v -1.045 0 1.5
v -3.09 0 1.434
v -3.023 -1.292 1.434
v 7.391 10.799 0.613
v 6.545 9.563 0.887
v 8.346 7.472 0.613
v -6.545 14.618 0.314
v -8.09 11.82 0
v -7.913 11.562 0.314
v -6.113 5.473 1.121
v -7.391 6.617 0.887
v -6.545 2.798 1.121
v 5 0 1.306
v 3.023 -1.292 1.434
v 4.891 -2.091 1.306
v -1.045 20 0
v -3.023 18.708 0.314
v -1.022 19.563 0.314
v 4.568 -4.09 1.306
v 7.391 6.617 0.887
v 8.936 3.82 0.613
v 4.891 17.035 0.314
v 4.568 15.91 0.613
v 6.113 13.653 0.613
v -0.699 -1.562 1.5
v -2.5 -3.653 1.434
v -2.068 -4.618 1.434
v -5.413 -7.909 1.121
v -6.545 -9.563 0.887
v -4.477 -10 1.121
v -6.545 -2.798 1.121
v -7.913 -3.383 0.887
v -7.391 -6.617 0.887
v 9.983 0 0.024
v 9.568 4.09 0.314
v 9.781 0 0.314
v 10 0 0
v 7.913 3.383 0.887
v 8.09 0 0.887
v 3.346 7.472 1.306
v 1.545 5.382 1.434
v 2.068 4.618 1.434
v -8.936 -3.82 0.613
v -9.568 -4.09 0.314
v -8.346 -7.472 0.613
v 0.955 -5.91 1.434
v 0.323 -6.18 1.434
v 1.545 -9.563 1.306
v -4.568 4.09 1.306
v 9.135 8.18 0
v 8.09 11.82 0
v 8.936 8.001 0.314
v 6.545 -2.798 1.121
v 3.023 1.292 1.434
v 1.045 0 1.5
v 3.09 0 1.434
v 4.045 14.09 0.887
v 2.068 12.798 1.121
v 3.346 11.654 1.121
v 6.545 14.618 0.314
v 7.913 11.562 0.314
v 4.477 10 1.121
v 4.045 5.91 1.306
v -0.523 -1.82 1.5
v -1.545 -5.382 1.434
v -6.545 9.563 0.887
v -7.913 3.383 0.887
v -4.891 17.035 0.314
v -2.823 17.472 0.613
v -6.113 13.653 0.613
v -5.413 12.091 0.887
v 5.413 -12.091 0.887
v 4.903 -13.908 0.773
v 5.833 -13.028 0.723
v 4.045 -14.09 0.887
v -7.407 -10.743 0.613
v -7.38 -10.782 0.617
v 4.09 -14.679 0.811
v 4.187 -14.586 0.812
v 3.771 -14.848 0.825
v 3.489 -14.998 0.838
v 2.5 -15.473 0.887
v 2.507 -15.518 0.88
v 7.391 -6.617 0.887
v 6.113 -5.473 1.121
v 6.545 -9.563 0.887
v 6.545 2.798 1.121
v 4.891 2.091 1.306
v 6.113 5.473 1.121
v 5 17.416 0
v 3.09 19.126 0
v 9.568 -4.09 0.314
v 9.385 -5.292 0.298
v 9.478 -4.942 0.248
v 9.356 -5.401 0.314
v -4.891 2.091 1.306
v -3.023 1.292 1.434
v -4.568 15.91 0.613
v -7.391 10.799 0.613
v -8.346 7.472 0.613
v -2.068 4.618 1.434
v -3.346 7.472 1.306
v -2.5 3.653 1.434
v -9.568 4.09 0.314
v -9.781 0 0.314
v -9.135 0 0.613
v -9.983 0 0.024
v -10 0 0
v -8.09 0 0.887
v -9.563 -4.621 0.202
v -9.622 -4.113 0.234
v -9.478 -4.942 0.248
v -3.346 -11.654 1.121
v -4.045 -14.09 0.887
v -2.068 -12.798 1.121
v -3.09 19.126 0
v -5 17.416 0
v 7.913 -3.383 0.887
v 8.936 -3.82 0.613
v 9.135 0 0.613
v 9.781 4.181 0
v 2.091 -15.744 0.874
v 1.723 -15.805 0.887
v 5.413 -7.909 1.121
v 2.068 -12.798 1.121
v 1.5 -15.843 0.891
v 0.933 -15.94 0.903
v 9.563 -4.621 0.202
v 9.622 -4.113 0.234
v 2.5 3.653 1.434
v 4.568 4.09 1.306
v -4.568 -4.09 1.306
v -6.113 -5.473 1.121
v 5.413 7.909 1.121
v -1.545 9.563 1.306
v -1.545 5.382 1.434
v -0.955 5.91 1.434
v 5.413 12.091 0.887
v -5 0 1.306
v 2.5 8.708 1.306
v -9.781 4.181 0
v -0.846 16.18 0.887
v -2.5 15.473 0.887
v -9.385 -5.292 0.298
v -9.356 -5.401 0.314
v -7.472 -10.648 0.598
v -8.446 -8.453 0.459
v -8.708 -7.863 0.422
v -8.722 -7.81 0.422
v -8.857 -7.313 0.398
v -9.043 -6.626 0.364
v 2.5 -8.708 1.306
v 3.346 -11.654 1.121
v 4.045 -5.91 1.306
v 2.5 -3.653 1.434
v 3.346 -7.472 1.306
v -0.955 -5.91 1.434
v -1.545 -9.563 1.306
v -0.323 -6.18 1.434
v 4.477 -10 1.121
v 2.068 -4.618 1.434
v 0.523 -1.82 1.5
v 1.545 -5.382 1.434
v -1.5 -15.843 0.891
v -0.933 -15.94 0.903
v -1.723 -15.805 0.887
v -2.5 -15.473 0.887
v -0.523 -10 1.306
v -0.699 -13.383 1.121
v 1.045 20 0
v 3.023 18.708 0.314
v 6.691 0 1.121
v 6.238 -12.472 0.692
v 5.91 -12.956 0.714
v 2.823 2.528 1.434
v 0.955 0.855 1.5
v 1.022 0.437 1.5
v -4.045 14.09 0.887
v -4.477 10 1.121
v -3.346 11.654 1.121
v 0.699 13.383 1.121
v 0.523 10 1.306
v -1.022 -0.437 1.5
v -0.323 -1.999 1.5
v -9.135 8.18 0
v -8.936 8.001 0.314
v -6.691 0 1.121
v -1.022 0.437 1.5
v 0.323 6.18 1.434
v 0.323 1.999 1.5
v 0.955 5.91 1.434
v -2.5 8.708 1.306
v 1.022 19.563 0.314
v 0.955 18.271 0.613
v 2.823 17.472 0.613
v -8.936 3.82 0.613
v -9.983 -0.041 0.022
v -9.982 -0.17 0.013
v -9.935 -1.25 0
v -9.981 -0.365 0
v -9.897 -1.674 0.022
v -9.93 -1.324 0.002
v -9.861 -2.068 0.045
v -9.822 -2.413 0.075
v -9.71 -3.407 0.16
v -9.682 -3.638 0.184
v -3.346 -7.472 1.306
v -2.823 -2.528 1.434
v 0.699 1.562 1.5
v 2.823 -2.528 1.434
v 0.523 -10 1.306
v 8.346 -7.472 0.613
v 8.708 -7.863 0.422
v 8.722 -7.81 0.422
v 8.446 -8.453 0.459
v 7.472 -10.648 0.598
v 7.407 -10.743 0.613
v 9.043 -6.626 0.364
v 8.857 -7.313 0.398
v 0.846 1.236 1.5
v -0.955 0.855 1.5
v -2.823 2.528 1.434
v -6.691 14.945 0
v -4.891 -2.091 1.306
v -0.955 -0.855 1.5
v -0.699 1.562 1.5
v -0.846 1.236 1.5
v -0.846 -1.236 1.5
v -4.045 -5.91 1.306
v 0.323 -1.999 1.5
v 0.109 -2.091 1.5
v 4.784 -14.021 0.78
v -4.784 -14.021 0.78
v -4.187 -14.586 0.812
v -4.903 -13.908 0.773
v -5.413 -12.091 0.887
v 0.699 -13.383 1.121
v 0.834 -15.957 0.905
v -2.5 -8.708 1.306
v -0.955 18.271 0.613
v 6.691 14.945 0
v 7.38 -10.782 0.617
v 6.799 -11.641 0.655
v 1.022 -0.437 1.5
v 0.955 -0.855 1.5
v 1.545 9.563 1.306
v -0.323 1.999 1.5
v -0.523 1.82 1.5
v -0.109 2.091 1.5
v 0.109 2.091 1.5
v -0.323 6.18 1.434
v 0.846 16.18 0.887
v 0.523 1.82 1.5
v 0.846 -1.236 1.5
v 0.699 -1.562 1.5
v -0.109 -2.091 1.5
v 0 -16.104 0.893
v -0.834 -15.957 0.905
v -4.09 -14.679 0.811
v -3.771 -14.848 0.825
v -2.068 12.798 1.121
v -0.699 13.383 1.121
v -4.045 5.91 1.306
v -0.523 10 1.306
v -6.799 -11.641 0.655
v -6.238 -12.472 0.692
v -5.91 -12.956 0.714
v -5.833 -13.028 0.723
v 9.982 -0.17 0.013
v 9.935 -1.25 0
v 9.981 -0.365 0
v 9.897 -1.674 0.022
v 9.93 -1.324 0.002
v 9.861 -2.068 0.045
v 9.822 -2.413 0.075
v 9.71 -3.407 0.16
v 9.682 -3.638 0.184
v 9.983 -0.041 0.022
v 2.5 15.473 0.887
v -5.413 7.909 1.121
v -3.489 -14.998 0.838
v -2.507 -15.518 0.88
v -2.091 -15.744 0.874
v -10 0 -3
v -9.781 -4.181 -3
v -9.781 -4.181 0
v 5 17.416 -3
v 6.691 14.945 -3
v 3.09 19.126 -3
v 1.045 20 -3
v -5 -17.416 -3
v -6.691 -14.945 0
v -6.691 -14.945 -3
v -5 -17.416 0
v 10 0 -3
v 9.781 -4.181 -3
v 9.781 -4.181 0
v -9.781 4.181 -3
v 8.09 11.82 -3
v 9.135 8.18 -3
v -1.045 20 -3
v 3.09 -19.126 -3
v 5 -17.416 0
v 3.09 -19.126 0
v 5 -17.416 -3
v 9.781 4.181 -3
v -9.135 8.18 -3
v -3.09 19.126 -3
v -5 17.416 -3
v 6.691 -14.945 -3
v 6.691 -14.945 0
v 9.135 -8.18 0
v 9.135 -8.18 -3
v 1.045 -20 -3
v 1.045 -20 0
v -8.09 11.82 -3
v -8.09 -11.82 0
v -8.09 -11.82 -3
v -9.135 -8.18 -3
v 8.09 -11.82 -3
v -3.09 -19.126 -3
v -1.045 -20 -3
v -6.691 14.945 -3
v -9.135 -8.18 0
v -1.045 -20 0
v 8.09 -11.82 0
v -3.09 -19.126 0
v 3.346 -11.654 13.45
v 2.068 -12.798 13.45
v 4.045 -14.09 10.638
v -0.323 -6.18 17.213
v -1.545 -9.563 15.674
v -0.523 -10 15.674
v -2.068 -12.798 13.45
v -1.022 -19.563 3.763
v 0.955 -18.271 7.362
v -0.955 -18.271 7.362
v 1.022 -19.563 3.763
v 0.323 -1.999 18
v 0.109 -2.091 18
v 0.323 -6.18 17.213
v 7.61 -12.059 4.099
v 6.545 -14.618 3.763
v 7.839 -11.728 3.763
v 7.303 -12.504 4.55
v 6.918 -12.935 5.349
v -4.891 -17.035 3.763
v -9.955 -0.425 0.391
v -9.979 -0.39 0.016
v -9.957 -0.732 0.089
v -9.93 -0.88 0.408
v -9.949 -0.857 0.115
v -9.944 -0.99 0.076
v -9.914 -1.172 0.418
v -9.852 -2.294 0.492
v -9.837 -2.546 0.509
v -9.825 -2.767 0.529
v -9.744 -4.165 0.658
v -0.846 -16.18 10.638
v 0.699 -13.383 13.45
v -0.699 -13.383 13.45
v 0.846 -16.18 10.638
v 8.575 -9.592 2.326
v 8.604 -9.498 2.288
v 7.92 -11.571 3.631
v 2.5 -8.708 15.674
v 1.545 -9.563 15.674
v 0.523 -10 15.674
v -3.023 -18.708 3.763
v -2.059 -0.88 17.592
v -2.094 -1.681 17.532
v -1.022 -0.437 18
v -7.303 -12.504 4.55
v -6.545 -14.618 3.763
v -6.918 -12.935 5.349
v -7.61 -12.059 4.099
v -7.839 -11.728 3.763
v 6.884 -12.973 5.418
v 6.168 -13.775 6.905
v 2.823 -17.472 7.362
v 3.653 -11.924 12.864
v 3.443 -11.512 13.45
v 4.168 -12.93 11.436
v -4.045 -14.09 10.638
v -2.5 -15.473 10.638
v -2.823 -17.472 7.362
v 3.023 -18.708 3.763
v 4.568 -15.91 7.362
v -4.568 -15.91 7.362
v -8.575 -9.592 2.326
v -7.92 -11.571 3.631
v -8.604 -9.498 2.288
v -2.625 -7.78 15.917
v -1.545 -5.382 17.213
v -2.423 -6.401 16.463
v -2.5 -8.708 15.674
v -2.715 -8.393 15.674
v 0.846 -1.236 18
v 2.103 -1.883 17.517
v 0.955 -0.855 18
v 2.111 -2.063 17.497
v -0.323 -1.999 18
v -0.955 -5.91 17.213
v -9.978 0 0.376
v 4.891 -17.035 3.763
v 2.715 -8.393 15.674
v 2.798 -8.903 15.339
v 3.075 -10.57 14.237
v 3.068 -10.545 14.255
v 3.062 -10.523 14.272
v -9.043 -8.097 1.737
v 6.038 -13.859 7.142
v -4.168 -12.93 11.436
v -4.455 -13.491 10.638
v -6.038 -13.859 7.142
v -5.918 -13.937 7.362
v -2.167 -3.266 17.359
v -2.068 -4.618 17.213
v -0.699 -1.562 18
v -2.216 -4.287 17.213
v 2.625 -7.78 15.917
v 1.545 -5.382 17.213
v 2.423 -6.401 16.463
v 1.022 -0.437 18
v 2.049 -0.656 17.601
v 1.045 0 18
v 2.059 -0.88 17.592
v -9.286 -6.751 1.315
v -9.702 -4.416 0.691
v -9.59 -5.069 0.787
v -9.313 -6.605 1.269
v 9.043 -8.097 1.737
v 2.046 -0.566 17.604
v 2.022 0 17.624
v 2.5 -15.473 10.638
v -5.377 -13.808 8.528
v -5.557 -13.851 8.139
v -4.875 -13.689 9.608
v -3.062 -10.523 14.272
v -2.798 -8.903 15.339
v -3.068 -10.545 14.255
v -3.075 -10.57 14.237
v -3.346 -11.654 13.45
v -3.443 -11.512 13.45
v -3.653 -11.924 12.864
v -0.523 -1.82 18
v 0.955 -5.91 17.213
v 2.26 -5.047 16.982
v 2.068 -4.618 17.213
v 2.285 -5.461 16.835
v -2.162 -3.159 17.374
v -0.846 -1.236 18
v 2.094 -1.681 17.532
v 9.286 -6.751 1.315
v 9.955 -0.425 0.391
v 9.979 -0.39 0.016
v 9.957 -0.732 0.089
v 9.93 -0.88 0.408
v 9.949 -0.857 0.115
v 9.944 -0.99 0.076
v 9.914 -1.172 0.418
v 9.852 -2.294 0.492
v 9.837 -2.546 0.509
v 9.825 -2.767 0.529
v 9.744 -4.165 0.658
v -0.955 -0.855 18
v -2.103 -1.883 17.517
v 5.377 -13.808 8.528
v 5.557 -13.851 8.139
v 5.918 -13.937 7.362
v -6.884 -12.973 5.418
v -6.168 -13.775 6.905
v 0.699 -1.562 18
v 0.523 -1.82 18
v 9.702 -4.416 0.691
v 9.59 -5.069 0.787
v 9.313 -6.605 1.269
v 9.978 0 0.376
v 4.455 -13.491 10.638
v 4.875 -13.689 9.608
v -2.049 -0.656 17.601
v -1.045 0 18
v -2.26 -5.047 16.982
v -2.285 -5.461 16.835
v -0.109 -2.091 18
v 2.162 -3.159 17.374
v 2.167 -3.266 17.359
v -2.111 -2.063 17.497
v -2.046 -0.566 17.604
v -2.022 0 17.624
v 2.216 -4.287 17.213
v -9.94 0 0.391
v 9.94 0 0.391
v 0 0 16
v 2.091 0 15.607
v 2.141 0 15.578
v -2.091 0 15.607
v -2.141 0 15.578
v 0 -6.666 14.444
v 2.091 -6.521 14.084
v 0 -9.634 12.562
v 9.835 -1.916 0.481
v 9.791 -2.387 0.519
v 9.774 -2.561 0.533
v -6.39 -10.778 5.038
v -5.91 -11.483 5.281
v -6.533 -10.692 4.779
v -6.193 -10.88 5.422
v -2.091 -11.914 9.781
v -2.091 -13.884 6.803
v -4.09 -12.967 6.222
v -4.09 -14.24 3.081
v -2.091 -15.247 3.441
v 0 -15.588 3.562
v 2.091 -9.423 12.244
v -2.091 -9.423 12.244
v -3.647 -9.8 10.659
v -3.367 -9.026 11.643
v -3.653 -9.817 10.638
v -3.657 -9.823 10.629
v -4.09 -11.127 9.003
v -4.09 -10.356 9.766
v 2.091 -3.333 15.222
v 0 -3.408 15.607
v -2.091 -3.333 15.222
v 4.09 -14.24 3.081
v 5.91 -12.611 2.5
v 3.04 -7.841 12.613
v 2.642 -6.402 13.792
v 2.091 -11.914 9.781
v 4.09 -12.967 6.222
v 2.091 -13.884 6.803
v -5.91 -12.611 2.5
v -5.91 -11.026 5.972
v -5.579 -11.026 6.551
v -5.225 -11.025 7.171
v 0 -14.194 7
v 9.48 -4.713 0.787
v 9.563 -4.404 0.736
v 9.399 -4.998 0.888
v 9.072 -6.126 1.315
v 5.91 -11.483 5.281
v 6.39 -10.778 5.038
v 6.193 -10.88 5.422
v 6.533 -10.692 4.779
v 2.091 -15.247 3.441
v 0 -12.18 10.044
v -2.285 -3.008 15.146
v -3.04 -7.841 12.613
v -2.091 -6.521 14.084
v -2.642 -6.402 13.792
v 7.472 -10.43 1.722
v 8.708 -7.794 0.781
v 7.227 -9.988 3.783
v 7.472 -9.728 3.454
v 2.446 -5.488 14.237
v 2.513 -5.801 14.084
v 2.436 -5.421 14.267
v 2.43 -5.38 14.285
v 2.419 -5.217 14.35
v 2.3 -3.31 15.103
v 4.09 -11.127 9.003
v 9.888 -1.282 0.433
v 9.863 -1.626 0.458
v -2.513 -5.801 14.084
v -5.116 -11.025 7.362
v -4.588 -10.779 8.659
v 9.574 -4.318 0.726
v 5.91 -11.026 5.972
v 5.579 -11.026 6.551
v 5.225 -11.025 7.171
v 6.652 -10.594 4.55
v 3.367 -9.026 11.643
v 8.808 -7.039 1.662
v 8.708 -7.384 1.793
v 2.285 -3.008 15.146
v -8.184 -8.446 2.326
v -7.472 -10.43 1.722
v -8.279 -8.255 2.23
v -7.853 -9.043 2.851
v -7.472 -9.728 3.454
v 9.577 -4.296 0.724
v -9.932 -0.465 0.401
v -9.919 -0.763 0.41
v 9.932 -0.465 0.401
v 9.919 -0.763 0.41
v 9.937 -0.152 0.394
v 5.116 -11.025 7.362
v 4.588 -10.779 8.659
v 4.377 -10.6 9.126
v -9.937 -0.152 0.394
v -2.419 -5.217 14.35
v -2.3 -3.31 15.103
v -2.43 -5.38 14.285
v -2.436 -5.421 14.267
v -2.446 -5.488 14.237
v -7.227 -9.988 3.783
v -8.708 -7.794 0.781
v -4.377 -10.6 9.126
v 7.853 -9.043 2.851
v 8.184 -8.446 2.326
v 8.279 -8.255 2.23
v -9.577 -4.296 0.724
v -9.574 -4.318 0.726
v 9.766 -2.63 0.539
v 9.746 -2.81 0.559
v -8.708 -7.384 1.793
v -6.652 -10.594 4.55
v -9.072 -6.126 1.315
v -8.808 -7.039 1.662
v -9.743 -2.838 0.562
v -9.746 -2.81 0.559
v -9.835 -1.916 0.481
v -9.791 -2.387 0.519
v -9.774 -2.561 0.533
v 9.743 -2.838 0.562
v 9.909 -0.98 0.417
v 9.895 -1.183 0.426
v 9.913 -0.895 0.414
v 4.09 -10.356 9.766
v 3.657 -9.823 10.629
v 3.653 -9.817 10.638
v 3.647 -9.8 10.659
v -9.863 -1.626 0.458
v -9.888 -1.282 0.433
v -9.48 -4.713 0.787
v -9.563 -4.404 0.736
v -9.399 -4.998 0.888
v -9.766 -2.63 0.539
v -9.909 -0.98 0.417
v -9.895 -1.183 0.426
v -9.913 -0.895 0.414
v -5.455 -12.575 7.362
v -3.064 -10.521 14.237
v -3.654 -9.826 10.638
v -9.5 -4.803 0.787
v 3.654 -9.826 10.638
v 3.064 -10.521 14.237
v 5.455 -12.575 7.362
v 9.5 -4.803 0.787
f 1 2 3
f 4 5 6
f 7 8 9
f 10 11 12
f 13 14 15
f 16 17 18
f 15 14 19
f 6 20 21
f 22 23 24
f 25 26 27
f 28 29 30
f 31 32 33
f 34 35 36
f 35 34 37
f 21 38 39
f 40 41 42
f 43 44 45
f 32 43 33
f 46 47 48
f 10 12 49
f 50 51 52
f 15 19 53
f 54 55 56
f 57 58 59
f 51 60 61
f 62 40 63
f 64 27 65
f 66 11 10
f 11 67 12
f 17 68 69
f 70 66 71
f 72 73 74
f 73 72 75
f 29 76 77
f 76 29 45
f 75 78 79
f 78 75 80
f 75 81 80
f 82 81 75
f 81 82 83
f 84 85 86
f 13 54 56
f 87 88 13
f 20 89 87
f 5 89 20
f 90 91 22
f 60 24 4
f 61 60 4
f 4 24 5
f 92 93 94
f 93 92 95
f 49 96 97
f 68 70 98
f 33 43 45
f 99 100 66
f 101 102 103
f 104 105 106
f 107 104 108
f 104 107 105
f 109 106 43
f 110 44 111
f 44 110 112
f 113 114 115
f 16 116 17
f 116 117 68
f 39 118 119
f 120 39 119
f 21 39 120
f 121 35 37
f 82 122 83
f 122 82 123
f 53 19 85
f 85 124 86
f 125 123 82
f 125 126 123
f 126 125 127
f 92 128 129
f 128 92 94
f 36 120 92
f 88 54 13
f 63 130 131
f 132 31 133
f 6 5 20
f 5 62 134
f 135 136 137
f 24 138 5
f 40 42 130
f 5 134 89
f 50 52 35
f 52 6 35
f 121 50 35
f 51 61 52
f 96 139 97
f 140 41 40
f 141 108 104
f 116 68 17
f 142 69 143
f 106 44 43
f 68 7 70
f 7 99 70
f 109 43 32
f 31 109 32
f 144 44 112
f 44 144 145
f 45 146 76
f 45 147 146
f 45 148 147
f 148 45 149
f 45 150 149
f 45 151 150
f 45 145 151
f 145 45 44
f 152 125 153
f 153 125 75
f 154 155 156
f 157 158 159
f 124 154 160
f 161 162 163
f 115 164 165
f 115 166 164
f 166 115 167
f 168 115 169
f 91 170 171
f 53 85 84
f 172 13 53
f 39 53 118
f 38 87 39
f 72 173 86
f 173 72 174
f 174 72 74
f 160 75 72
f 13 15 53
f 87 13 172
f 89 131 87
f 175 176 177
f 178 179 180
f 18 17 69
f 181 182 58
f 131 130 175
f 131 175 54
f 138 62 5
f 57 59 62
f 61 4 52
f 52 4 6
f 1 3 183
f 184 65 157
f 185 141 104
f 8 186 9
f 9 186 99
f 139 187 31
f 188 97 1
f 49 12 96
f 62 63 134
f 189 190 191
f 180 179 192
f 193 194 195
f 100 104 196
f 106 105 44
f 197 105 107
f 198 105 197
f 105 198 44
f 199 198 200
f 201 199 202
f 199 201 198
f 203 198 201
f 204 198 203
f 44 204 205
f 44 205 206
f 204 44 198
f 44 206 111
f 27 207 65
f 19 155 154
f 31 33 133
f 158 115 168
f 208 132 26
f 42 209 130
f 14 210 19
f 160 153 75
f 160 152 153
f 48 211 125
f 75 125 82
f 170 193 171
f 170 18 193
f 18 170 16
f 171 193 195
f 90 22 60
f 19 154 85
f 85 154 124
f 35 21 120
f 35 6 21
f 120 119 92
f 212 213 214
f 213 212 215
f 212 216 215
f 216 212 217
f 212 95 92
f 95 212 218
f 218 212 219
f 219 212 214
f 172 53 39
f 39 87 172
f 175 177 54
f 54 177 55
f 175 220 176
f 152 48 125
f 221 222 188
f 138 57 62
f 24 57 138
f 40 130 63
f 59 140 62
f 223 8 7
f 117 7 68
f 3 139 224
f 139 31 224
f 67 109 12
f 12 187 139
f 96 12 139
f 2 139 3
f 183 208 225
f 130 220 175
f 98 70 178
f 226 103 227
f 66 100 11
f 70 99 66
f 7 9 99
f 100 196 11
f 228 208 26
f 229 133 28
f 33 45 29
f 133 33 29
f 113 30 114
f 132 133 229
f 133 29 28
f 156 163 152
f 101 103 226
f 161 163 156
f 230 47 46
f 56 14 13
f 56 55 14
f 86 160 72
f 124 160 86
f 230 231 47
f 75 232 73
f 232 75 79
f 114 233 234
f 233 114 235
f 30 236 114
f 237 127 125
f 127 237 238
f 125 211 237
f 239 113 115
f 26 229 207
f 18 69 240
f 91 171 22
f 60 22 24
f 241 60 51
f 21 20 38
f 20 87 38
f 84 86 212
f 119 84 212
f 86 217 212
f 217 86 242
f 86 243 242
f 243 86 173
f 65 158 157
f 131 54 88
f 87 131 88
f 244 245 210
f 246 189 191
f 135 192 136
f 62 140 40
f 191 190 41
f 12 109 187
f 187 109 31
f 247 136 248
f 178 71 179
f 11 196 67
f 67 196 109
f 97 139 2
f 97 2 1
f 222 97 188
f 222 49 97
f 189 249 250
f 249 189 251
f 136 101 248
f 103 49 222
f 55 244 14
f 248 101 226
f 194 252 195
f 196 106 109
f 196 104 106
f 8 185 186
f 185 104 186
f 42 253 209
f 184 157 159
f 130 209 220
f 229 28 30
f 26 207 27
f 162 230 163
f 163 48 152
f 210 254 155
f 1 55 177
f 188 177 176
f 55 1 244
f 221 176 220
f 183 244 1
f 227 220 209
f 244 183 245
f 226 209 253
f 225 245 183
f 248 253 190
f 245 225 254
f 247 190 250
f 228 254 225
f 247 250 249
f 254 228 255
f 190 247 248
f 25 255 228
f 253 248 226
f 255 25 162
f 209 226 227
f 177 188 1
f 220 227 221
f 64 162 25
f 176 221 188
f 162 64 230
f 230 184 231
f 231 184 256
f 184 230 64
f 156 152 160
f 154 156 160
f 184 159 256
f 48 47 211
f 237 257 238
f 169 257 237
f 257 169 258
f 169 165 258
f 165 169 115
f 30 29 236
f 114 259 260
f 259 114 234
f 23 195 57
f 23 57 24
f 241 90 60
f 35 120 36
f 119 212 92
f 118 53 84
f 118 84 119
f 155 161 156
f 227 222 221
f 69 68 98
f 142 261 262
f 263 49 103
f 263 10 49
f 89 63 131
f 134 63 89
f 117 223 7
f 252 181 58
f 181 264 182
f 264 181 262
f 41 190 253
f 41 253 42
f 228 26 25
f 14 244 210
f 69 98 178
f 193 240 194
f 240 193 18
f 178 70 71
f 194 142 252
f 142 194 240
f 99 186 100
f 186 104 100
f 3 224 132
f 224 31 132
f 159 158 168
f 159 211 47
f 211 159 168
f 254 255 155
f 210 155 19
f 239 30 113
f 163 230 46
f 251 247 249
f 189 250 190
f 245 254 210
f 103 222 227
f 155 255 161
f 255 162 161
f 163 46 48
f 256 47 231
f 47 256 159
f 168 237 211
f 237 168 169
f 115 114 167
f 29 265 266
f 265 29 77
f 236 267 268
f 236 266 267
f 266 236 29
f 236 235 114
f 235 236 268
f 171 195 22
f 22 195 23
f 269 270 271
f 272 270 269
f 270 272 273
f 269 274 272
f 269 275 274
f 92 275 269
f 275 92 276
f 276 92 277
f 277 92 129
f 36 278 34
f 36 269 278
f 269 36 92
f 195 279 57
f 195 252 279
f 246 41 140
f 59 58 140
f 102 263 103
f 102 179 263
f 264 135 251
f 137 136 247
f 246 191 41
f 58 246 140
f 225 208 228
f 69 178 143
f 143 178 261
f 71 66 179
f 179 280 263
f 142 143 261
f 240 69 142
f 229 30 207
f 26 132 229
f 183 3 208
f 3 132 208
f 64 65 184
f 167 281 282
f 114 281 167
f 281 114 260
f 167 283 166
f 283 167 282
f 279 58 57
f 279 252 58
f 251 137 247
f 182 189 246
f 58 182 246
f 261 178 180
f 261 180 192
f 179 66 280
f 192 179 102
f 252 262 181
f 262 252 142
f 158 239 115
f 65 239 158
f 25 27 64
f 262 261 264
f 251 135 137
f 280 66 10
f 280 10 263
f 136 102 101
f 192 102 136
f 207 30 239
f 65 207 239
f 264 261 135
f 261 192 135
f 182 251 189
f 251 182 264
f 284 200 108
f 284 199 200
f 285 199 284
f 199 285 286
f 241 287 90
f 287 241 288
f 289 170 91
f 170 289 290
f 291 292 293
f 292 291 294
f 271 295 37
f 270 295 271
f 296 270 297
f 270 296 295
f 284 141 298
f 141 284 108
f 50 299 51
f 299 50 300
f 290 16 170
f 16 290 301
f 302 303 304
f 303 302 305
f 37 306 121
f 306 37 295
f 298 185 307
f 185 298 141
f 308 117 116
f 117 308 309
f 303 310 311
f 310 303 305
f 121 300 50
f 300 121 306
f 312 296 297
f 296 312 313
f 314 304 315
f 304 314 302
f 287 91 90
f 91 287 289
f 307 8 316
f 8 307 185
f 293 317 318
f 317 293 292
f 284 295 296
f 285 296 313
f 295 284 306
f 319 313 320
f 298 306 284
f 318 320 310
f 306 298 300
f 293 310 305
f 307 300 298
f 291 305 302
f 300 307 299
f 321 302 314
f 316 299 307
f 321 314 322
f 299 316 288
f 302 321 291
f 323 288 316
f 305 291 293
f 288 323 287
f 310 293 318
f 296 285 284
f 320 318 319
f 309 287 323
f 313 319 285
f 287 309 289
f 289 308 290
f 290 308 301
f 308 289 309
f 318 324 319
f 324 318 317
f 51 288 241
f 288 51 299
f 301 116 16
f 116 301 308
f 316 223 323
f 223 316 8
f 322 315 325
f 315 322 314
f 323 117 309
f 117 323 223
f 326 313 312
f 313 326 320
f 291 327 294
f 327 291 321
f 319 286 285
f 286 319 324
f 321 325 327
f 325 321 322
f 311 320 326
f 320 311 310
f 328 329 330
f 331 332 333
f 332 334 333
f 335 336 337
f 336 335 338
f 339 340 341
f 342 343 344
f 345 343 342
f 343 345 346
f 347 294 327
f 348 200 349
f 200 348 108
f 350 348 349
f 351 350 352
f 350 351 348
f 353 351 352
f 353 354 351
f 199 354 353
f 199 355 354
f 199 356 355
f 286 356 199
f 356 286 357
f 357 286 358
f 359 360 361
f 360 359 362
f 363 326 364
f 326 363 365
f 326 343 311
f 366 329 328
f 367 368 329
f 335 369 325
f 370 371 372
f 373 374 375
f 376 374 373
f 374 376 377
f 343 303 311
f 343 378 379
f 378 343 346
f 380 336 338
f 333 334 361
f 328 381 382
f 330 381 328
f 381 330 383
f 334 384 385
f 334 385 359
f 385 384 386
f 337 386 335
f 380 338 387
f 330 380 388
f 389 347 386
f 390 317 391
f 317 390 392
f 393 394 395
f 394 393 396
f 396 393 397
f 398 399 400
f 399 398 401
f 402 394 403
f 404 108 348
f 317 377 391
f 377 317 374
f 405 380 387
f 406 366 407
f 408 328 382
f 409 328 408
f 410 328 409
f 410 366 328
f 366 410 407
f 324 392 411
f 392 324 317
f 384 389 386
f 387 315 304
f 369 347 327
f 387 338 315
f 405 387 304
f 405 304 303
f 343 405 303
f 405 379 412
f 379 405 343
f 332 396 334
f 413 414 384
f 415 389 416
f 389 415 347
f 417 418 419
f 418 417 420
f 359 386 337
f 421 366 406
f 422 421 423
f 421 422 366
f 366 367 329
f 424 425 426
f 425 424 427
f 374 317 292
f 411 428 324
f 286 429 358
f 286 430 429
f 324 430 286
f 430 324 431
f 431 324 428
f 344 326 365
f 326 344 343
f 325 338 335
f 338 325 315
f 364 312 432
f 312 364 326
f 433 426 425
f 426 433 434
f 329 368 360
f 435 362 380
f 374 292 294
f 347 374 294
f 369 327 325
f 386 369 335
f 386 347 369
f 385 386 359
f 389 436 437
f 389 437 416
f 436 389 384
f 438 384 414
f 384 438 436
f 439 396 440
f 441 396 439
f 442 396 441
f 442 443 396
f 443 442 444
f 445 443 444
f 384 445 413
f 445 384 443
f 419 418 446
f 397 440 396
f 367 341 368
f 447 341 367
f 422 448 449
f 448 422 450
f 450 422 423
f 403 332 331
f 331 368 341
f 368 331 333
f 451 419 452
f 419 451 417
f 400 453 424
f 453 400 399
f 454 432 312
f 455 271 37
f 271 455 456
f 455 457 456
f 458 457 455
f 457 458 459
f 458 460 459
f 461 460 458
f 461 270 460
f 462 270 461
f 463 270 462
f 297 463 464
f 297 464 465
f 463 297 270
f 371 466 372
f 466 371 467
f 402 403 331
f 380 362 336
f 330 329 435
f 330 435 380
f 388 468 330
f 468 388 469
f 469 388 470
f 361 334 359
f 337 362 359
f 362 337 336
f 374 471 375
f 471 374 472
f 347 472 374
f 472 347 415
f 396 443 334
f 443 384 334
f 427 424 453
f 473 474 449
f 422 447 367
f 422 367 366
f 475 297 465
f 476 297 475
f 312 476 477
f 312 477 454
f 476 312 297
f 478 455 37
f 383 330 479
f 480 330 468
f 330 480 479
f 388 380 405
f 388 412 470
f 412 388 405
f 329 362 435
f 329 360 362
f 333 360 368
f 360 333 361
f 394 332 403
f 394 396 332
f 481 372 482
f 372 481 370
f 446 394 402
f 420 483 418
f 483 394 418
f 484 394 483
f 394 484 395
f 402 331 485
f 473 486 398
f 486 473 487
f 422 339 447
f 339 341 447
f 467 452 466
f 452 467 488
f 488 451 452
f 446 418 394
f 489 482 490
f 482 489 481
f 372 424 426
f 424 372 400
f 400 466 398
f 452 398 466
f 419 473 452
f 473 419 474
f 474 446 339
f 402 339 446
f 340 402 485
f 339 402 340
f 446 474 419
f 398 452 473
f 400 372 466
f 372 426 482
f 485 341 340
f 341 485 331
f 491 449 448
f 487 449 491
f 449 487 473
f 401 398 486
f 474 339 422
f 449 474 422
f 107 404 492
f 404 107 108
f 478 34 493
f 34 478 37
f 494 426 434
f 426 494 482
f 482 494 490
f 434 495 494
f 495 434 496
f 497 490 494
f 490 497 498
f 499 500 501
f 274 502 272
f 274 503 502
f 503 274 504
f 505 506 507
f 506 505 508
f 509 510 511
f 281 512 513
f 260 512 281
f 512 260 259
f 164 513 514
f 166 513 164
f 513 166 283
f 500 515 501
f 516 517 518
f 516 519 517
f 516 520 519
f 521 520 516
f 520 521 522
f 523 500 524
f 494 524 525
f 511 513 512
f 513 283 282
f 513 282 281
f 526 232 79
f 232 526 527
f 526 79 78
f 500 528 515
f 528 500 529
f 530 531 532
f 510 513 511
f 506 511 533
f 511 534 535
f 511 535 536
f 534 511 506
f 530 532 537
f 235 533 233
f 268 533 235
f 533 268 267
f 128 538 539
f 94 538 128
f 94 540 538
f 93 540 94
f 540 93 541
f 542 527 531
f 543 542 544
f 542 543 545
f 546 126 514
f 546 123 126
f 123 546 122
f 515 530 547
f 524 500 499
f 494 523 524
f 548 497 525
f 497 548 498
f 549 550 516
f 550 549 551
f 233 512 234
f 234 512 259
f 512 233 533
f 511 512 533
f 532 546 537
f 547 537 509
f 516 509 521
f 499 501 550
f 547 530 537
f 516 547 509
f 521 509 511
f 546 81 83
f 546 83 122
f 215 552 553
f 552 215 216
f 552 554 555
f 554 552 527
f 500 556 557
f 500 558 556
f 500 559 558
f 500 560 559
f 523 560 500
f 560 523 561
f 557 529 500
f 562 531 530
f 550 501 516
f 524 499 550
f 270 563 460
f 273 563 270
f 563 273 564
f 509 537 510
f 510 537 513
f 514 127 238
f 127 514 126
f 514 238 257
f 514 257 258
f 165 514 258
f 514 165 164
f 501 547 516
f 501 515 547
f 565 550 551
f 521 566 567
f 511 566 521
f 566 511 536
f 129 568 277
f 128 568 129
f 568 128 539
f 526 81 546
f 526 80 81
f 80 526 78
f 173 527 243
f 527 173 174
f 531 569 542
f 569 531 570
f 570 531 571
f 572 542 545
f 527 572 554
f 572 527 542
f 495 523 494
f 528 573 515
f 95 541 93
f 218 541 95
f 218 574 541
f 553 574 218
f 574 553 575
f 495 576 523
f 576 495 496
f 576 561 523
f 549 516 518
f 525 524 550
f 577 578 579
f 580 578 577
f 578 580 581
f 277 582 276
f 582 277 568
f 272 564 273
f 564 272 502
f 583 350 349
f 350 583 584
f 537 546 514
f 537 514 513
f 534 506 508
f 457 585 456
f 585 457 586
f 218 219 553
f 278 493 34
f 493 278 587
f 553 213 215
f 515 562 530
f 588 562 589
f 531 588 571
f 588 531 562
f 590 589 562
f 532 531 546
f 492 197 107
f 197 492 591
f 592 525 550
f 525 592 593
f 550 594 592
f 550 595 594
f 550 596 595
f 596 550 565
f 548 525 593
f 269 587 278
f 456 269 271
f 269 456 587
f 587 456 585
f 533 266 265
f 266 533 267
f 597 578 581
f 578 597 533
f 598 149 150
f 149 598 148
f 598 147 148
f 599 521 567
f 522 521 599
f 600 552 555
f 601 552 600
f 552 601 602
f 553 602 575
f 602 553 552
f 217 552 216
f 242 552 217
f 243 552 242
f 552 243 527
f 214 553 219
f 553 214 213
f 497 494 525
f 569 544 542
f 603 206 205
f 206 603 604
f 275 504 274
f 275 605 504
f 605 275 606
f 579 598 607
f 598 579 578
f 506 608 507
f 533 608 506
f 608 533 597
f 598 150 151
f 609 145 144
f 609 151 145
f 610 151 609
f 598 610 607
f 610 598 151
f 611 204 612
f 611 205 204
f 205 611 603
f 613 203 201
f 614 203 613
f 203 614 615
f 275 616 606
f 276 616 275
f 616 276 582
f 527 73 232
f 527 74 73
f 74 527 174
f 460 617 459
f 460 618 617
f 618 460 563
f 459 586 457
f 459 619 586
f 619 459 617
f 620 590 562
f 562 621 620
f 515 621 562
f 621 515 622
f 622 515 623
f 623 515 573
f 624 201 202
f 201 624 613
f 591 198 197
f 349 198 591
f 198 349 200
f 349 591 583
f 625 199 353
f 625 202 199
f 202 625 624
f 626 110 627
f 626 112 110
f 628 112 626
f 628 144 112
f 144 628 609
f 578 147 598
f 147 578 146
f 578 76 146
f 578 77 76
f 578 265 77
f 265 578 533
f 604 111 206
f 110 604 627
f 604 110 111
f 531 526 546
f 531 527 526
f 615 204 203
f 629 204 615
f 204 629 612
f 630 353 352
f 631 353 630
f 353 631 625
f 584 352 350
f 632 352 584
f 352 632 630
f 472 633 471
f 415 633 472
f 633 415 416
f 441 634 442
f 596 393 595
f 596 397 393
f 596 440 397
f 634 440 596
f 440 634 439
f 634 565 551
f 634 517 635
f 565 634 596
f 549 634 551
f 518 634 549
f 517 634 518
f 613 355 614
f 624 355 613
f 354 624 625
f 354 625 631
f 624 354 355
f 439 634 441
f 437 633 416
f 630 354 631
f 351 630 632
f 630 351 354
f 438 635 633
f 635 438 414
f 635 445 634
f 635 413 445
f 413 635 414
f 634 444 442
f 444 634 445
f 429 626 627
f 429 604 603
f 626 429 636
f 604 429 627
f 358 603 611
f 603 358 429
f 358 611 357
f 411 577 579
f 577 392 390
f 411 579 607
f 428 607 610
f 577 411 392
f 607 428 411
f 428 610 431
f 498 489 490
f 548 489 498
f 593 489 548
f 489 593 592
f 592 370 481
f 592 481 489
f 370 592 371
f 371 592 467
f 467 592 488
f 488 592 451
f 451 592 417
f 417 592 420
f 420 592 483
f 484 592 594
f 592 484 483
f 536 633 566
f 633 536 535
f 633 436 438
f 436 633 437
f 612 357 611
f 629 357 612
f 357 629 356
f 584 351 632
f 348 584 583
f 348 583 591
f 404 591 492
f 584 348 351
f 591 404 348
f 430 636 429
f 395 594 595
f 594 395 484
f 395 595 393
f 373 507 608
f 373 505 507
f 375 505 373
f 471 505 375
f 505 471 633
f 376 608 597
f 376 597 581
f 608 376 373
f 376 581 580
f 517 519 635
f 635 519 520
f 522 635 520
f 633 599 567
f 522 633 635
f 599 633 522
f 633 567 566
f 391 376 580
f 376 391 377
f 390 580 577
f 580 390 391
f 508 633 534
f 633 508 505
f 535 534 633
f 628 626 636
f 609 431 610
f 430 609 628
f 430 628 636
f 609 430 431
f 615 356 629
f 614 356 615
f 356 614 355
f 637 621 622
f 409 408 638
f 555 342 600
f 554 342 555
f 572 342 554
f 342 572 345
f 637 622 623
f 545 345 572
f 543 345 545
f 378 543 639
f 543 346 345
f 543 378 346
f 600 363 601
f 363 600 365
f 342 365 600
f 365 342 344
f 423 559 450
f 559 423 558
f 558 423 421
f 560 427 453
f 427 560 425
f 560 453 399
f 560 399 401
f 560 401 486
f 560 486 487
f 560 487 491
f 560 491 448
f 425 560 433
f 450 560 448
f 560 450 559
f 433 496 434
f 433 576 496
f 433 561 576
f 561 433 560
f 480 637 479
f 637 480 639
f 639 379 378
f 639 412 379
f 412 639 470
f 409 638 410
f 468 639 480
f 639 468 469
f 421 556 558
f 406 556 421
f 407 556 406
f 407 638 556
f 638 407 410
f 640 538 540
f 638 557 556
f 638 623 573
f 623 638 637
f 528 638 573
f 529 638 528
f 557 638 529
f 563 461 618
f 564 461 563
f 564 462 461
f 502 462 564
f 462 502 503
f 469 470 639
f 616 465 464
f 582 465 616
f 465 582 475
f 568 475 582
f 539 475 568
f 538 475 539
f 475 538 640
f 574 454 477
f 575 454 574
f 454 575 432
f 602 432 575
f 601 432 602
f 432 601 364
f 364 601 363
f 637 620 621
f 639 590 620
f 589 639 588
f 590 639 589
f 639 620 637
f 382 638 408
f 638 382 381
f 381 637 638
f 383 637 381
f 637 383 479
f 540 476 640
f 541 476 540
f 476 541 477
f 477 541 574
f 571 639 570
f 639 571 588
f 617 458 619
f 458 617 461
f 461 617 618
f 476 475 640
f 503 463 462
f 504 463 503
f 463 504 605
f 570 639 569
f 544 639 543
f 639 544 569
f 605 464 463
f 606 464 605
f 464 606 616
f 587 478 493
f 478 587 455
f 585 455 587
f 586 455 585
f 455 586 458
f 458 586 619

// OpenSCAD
base_thickness = 6;
base_height = 40;
base_width = 20;
hook_distance = 36;
fixing_hole = 0;      //[0:OFF, else:diameter]
// new parameters by mcmusic :
point_size = 2;       // the size of the hook tip
more_cutaway = 0.7;   // [0:originalDesign to 1:maximumCutaway]
base_convexity = 3.0; //0.001=flat; 3=original
// The sticky tape can be hidden in a cavity below the base.
// But this must eventually be printed with support - may be difficult to remove.
cavity = 0;           //[0:OFF, else: cavity_depth]
cavity_rim = 2;

Sfn = 30; //30 for testing, 90 for prints.

module Cavity() {
  if (cavity > 0)
  {
    color("red")
    translate([0, 0, -base_thickness / 2])
    {
      resize([base_width - 2 * cavity_rim, base_height - 2 * cavity_rim, cavity])
      cylinder(10, r = 10, center = true, $fn = Sfn);
    }
  }
}

module Base()
{
  //convexity, resting on top of the main base cylinder
  resize([base_width, base_height, base_convexity])sphere(r = 10, center = true, $fn = Sfn);
  //main cylinder of the base
  translate([0, 0, -base_thickness / 4])
  {
    resize([base_width, base_height, 0])cylinder(base_thickness / 2, r = 10, center = true, $fn = Sfn);
  }
}

module Hook()
{
  cutaway = 0.9 * more_cutaway * base_height / 2;

  difference() {
    //sphere above base
    resize([base_width, base_height, hook_distance])sphere(r = 10, center = true, $fn = Sfn);

    //cut away the -z half with a cube
    translate([0, 0, -hook_distance / 2])
    {
      cube([base_width + 1, base_height + 1, hook_distance], center = true);
    }

    //cut away the +y half with a cube
    translate([0, base_height / 2, hook_distance / 2])
    {
      cube([base_width + 1, base_height, hook_distance], center = true);
    }

    //cut away hook in -y direction inside
    translate([0, 0, -point_size])
    {
      rotate ([0, 90, 0])
      resize([hook_distance, base_height / 2 + cutaway, base_width])sphere (hook_distance, base_width, center = true, $fn = Sfn);
    }

    //cutaway hook in -x direction
    translate([-base_width / 2 - point_size, 0, hook_distance / 2])
    { resize([base_width, base_height + cutaway, hook_distance])sphere(r = 10, center = true, $fn = Sfn);
    }

    //cutaway hook in +x direction
    translate([base_width / 2 + point_size, 0, hook_distance / 2])
    { resize([base_width, base_height + cutaway, hook_distance])sphere(r = 10, center = true, $fn = Sfn);
    }
  }
}

module Hole()
{
  if (fixing_hole > 0)
  {
    translate([0, base_height / 5, 1.5])
    {
      cylinder(base_thickness * 2, d = fixing_hole, center = true, $fn = Sfn);
      cylinder(h = fixing_hole, d1 = fixing_hole, d2 = fixing_hole * 2, center = true, $fn = Sfn);
    }
  }
}

difference()
{
  Base();
  Hole();
  Cavity();
}
Hook();
